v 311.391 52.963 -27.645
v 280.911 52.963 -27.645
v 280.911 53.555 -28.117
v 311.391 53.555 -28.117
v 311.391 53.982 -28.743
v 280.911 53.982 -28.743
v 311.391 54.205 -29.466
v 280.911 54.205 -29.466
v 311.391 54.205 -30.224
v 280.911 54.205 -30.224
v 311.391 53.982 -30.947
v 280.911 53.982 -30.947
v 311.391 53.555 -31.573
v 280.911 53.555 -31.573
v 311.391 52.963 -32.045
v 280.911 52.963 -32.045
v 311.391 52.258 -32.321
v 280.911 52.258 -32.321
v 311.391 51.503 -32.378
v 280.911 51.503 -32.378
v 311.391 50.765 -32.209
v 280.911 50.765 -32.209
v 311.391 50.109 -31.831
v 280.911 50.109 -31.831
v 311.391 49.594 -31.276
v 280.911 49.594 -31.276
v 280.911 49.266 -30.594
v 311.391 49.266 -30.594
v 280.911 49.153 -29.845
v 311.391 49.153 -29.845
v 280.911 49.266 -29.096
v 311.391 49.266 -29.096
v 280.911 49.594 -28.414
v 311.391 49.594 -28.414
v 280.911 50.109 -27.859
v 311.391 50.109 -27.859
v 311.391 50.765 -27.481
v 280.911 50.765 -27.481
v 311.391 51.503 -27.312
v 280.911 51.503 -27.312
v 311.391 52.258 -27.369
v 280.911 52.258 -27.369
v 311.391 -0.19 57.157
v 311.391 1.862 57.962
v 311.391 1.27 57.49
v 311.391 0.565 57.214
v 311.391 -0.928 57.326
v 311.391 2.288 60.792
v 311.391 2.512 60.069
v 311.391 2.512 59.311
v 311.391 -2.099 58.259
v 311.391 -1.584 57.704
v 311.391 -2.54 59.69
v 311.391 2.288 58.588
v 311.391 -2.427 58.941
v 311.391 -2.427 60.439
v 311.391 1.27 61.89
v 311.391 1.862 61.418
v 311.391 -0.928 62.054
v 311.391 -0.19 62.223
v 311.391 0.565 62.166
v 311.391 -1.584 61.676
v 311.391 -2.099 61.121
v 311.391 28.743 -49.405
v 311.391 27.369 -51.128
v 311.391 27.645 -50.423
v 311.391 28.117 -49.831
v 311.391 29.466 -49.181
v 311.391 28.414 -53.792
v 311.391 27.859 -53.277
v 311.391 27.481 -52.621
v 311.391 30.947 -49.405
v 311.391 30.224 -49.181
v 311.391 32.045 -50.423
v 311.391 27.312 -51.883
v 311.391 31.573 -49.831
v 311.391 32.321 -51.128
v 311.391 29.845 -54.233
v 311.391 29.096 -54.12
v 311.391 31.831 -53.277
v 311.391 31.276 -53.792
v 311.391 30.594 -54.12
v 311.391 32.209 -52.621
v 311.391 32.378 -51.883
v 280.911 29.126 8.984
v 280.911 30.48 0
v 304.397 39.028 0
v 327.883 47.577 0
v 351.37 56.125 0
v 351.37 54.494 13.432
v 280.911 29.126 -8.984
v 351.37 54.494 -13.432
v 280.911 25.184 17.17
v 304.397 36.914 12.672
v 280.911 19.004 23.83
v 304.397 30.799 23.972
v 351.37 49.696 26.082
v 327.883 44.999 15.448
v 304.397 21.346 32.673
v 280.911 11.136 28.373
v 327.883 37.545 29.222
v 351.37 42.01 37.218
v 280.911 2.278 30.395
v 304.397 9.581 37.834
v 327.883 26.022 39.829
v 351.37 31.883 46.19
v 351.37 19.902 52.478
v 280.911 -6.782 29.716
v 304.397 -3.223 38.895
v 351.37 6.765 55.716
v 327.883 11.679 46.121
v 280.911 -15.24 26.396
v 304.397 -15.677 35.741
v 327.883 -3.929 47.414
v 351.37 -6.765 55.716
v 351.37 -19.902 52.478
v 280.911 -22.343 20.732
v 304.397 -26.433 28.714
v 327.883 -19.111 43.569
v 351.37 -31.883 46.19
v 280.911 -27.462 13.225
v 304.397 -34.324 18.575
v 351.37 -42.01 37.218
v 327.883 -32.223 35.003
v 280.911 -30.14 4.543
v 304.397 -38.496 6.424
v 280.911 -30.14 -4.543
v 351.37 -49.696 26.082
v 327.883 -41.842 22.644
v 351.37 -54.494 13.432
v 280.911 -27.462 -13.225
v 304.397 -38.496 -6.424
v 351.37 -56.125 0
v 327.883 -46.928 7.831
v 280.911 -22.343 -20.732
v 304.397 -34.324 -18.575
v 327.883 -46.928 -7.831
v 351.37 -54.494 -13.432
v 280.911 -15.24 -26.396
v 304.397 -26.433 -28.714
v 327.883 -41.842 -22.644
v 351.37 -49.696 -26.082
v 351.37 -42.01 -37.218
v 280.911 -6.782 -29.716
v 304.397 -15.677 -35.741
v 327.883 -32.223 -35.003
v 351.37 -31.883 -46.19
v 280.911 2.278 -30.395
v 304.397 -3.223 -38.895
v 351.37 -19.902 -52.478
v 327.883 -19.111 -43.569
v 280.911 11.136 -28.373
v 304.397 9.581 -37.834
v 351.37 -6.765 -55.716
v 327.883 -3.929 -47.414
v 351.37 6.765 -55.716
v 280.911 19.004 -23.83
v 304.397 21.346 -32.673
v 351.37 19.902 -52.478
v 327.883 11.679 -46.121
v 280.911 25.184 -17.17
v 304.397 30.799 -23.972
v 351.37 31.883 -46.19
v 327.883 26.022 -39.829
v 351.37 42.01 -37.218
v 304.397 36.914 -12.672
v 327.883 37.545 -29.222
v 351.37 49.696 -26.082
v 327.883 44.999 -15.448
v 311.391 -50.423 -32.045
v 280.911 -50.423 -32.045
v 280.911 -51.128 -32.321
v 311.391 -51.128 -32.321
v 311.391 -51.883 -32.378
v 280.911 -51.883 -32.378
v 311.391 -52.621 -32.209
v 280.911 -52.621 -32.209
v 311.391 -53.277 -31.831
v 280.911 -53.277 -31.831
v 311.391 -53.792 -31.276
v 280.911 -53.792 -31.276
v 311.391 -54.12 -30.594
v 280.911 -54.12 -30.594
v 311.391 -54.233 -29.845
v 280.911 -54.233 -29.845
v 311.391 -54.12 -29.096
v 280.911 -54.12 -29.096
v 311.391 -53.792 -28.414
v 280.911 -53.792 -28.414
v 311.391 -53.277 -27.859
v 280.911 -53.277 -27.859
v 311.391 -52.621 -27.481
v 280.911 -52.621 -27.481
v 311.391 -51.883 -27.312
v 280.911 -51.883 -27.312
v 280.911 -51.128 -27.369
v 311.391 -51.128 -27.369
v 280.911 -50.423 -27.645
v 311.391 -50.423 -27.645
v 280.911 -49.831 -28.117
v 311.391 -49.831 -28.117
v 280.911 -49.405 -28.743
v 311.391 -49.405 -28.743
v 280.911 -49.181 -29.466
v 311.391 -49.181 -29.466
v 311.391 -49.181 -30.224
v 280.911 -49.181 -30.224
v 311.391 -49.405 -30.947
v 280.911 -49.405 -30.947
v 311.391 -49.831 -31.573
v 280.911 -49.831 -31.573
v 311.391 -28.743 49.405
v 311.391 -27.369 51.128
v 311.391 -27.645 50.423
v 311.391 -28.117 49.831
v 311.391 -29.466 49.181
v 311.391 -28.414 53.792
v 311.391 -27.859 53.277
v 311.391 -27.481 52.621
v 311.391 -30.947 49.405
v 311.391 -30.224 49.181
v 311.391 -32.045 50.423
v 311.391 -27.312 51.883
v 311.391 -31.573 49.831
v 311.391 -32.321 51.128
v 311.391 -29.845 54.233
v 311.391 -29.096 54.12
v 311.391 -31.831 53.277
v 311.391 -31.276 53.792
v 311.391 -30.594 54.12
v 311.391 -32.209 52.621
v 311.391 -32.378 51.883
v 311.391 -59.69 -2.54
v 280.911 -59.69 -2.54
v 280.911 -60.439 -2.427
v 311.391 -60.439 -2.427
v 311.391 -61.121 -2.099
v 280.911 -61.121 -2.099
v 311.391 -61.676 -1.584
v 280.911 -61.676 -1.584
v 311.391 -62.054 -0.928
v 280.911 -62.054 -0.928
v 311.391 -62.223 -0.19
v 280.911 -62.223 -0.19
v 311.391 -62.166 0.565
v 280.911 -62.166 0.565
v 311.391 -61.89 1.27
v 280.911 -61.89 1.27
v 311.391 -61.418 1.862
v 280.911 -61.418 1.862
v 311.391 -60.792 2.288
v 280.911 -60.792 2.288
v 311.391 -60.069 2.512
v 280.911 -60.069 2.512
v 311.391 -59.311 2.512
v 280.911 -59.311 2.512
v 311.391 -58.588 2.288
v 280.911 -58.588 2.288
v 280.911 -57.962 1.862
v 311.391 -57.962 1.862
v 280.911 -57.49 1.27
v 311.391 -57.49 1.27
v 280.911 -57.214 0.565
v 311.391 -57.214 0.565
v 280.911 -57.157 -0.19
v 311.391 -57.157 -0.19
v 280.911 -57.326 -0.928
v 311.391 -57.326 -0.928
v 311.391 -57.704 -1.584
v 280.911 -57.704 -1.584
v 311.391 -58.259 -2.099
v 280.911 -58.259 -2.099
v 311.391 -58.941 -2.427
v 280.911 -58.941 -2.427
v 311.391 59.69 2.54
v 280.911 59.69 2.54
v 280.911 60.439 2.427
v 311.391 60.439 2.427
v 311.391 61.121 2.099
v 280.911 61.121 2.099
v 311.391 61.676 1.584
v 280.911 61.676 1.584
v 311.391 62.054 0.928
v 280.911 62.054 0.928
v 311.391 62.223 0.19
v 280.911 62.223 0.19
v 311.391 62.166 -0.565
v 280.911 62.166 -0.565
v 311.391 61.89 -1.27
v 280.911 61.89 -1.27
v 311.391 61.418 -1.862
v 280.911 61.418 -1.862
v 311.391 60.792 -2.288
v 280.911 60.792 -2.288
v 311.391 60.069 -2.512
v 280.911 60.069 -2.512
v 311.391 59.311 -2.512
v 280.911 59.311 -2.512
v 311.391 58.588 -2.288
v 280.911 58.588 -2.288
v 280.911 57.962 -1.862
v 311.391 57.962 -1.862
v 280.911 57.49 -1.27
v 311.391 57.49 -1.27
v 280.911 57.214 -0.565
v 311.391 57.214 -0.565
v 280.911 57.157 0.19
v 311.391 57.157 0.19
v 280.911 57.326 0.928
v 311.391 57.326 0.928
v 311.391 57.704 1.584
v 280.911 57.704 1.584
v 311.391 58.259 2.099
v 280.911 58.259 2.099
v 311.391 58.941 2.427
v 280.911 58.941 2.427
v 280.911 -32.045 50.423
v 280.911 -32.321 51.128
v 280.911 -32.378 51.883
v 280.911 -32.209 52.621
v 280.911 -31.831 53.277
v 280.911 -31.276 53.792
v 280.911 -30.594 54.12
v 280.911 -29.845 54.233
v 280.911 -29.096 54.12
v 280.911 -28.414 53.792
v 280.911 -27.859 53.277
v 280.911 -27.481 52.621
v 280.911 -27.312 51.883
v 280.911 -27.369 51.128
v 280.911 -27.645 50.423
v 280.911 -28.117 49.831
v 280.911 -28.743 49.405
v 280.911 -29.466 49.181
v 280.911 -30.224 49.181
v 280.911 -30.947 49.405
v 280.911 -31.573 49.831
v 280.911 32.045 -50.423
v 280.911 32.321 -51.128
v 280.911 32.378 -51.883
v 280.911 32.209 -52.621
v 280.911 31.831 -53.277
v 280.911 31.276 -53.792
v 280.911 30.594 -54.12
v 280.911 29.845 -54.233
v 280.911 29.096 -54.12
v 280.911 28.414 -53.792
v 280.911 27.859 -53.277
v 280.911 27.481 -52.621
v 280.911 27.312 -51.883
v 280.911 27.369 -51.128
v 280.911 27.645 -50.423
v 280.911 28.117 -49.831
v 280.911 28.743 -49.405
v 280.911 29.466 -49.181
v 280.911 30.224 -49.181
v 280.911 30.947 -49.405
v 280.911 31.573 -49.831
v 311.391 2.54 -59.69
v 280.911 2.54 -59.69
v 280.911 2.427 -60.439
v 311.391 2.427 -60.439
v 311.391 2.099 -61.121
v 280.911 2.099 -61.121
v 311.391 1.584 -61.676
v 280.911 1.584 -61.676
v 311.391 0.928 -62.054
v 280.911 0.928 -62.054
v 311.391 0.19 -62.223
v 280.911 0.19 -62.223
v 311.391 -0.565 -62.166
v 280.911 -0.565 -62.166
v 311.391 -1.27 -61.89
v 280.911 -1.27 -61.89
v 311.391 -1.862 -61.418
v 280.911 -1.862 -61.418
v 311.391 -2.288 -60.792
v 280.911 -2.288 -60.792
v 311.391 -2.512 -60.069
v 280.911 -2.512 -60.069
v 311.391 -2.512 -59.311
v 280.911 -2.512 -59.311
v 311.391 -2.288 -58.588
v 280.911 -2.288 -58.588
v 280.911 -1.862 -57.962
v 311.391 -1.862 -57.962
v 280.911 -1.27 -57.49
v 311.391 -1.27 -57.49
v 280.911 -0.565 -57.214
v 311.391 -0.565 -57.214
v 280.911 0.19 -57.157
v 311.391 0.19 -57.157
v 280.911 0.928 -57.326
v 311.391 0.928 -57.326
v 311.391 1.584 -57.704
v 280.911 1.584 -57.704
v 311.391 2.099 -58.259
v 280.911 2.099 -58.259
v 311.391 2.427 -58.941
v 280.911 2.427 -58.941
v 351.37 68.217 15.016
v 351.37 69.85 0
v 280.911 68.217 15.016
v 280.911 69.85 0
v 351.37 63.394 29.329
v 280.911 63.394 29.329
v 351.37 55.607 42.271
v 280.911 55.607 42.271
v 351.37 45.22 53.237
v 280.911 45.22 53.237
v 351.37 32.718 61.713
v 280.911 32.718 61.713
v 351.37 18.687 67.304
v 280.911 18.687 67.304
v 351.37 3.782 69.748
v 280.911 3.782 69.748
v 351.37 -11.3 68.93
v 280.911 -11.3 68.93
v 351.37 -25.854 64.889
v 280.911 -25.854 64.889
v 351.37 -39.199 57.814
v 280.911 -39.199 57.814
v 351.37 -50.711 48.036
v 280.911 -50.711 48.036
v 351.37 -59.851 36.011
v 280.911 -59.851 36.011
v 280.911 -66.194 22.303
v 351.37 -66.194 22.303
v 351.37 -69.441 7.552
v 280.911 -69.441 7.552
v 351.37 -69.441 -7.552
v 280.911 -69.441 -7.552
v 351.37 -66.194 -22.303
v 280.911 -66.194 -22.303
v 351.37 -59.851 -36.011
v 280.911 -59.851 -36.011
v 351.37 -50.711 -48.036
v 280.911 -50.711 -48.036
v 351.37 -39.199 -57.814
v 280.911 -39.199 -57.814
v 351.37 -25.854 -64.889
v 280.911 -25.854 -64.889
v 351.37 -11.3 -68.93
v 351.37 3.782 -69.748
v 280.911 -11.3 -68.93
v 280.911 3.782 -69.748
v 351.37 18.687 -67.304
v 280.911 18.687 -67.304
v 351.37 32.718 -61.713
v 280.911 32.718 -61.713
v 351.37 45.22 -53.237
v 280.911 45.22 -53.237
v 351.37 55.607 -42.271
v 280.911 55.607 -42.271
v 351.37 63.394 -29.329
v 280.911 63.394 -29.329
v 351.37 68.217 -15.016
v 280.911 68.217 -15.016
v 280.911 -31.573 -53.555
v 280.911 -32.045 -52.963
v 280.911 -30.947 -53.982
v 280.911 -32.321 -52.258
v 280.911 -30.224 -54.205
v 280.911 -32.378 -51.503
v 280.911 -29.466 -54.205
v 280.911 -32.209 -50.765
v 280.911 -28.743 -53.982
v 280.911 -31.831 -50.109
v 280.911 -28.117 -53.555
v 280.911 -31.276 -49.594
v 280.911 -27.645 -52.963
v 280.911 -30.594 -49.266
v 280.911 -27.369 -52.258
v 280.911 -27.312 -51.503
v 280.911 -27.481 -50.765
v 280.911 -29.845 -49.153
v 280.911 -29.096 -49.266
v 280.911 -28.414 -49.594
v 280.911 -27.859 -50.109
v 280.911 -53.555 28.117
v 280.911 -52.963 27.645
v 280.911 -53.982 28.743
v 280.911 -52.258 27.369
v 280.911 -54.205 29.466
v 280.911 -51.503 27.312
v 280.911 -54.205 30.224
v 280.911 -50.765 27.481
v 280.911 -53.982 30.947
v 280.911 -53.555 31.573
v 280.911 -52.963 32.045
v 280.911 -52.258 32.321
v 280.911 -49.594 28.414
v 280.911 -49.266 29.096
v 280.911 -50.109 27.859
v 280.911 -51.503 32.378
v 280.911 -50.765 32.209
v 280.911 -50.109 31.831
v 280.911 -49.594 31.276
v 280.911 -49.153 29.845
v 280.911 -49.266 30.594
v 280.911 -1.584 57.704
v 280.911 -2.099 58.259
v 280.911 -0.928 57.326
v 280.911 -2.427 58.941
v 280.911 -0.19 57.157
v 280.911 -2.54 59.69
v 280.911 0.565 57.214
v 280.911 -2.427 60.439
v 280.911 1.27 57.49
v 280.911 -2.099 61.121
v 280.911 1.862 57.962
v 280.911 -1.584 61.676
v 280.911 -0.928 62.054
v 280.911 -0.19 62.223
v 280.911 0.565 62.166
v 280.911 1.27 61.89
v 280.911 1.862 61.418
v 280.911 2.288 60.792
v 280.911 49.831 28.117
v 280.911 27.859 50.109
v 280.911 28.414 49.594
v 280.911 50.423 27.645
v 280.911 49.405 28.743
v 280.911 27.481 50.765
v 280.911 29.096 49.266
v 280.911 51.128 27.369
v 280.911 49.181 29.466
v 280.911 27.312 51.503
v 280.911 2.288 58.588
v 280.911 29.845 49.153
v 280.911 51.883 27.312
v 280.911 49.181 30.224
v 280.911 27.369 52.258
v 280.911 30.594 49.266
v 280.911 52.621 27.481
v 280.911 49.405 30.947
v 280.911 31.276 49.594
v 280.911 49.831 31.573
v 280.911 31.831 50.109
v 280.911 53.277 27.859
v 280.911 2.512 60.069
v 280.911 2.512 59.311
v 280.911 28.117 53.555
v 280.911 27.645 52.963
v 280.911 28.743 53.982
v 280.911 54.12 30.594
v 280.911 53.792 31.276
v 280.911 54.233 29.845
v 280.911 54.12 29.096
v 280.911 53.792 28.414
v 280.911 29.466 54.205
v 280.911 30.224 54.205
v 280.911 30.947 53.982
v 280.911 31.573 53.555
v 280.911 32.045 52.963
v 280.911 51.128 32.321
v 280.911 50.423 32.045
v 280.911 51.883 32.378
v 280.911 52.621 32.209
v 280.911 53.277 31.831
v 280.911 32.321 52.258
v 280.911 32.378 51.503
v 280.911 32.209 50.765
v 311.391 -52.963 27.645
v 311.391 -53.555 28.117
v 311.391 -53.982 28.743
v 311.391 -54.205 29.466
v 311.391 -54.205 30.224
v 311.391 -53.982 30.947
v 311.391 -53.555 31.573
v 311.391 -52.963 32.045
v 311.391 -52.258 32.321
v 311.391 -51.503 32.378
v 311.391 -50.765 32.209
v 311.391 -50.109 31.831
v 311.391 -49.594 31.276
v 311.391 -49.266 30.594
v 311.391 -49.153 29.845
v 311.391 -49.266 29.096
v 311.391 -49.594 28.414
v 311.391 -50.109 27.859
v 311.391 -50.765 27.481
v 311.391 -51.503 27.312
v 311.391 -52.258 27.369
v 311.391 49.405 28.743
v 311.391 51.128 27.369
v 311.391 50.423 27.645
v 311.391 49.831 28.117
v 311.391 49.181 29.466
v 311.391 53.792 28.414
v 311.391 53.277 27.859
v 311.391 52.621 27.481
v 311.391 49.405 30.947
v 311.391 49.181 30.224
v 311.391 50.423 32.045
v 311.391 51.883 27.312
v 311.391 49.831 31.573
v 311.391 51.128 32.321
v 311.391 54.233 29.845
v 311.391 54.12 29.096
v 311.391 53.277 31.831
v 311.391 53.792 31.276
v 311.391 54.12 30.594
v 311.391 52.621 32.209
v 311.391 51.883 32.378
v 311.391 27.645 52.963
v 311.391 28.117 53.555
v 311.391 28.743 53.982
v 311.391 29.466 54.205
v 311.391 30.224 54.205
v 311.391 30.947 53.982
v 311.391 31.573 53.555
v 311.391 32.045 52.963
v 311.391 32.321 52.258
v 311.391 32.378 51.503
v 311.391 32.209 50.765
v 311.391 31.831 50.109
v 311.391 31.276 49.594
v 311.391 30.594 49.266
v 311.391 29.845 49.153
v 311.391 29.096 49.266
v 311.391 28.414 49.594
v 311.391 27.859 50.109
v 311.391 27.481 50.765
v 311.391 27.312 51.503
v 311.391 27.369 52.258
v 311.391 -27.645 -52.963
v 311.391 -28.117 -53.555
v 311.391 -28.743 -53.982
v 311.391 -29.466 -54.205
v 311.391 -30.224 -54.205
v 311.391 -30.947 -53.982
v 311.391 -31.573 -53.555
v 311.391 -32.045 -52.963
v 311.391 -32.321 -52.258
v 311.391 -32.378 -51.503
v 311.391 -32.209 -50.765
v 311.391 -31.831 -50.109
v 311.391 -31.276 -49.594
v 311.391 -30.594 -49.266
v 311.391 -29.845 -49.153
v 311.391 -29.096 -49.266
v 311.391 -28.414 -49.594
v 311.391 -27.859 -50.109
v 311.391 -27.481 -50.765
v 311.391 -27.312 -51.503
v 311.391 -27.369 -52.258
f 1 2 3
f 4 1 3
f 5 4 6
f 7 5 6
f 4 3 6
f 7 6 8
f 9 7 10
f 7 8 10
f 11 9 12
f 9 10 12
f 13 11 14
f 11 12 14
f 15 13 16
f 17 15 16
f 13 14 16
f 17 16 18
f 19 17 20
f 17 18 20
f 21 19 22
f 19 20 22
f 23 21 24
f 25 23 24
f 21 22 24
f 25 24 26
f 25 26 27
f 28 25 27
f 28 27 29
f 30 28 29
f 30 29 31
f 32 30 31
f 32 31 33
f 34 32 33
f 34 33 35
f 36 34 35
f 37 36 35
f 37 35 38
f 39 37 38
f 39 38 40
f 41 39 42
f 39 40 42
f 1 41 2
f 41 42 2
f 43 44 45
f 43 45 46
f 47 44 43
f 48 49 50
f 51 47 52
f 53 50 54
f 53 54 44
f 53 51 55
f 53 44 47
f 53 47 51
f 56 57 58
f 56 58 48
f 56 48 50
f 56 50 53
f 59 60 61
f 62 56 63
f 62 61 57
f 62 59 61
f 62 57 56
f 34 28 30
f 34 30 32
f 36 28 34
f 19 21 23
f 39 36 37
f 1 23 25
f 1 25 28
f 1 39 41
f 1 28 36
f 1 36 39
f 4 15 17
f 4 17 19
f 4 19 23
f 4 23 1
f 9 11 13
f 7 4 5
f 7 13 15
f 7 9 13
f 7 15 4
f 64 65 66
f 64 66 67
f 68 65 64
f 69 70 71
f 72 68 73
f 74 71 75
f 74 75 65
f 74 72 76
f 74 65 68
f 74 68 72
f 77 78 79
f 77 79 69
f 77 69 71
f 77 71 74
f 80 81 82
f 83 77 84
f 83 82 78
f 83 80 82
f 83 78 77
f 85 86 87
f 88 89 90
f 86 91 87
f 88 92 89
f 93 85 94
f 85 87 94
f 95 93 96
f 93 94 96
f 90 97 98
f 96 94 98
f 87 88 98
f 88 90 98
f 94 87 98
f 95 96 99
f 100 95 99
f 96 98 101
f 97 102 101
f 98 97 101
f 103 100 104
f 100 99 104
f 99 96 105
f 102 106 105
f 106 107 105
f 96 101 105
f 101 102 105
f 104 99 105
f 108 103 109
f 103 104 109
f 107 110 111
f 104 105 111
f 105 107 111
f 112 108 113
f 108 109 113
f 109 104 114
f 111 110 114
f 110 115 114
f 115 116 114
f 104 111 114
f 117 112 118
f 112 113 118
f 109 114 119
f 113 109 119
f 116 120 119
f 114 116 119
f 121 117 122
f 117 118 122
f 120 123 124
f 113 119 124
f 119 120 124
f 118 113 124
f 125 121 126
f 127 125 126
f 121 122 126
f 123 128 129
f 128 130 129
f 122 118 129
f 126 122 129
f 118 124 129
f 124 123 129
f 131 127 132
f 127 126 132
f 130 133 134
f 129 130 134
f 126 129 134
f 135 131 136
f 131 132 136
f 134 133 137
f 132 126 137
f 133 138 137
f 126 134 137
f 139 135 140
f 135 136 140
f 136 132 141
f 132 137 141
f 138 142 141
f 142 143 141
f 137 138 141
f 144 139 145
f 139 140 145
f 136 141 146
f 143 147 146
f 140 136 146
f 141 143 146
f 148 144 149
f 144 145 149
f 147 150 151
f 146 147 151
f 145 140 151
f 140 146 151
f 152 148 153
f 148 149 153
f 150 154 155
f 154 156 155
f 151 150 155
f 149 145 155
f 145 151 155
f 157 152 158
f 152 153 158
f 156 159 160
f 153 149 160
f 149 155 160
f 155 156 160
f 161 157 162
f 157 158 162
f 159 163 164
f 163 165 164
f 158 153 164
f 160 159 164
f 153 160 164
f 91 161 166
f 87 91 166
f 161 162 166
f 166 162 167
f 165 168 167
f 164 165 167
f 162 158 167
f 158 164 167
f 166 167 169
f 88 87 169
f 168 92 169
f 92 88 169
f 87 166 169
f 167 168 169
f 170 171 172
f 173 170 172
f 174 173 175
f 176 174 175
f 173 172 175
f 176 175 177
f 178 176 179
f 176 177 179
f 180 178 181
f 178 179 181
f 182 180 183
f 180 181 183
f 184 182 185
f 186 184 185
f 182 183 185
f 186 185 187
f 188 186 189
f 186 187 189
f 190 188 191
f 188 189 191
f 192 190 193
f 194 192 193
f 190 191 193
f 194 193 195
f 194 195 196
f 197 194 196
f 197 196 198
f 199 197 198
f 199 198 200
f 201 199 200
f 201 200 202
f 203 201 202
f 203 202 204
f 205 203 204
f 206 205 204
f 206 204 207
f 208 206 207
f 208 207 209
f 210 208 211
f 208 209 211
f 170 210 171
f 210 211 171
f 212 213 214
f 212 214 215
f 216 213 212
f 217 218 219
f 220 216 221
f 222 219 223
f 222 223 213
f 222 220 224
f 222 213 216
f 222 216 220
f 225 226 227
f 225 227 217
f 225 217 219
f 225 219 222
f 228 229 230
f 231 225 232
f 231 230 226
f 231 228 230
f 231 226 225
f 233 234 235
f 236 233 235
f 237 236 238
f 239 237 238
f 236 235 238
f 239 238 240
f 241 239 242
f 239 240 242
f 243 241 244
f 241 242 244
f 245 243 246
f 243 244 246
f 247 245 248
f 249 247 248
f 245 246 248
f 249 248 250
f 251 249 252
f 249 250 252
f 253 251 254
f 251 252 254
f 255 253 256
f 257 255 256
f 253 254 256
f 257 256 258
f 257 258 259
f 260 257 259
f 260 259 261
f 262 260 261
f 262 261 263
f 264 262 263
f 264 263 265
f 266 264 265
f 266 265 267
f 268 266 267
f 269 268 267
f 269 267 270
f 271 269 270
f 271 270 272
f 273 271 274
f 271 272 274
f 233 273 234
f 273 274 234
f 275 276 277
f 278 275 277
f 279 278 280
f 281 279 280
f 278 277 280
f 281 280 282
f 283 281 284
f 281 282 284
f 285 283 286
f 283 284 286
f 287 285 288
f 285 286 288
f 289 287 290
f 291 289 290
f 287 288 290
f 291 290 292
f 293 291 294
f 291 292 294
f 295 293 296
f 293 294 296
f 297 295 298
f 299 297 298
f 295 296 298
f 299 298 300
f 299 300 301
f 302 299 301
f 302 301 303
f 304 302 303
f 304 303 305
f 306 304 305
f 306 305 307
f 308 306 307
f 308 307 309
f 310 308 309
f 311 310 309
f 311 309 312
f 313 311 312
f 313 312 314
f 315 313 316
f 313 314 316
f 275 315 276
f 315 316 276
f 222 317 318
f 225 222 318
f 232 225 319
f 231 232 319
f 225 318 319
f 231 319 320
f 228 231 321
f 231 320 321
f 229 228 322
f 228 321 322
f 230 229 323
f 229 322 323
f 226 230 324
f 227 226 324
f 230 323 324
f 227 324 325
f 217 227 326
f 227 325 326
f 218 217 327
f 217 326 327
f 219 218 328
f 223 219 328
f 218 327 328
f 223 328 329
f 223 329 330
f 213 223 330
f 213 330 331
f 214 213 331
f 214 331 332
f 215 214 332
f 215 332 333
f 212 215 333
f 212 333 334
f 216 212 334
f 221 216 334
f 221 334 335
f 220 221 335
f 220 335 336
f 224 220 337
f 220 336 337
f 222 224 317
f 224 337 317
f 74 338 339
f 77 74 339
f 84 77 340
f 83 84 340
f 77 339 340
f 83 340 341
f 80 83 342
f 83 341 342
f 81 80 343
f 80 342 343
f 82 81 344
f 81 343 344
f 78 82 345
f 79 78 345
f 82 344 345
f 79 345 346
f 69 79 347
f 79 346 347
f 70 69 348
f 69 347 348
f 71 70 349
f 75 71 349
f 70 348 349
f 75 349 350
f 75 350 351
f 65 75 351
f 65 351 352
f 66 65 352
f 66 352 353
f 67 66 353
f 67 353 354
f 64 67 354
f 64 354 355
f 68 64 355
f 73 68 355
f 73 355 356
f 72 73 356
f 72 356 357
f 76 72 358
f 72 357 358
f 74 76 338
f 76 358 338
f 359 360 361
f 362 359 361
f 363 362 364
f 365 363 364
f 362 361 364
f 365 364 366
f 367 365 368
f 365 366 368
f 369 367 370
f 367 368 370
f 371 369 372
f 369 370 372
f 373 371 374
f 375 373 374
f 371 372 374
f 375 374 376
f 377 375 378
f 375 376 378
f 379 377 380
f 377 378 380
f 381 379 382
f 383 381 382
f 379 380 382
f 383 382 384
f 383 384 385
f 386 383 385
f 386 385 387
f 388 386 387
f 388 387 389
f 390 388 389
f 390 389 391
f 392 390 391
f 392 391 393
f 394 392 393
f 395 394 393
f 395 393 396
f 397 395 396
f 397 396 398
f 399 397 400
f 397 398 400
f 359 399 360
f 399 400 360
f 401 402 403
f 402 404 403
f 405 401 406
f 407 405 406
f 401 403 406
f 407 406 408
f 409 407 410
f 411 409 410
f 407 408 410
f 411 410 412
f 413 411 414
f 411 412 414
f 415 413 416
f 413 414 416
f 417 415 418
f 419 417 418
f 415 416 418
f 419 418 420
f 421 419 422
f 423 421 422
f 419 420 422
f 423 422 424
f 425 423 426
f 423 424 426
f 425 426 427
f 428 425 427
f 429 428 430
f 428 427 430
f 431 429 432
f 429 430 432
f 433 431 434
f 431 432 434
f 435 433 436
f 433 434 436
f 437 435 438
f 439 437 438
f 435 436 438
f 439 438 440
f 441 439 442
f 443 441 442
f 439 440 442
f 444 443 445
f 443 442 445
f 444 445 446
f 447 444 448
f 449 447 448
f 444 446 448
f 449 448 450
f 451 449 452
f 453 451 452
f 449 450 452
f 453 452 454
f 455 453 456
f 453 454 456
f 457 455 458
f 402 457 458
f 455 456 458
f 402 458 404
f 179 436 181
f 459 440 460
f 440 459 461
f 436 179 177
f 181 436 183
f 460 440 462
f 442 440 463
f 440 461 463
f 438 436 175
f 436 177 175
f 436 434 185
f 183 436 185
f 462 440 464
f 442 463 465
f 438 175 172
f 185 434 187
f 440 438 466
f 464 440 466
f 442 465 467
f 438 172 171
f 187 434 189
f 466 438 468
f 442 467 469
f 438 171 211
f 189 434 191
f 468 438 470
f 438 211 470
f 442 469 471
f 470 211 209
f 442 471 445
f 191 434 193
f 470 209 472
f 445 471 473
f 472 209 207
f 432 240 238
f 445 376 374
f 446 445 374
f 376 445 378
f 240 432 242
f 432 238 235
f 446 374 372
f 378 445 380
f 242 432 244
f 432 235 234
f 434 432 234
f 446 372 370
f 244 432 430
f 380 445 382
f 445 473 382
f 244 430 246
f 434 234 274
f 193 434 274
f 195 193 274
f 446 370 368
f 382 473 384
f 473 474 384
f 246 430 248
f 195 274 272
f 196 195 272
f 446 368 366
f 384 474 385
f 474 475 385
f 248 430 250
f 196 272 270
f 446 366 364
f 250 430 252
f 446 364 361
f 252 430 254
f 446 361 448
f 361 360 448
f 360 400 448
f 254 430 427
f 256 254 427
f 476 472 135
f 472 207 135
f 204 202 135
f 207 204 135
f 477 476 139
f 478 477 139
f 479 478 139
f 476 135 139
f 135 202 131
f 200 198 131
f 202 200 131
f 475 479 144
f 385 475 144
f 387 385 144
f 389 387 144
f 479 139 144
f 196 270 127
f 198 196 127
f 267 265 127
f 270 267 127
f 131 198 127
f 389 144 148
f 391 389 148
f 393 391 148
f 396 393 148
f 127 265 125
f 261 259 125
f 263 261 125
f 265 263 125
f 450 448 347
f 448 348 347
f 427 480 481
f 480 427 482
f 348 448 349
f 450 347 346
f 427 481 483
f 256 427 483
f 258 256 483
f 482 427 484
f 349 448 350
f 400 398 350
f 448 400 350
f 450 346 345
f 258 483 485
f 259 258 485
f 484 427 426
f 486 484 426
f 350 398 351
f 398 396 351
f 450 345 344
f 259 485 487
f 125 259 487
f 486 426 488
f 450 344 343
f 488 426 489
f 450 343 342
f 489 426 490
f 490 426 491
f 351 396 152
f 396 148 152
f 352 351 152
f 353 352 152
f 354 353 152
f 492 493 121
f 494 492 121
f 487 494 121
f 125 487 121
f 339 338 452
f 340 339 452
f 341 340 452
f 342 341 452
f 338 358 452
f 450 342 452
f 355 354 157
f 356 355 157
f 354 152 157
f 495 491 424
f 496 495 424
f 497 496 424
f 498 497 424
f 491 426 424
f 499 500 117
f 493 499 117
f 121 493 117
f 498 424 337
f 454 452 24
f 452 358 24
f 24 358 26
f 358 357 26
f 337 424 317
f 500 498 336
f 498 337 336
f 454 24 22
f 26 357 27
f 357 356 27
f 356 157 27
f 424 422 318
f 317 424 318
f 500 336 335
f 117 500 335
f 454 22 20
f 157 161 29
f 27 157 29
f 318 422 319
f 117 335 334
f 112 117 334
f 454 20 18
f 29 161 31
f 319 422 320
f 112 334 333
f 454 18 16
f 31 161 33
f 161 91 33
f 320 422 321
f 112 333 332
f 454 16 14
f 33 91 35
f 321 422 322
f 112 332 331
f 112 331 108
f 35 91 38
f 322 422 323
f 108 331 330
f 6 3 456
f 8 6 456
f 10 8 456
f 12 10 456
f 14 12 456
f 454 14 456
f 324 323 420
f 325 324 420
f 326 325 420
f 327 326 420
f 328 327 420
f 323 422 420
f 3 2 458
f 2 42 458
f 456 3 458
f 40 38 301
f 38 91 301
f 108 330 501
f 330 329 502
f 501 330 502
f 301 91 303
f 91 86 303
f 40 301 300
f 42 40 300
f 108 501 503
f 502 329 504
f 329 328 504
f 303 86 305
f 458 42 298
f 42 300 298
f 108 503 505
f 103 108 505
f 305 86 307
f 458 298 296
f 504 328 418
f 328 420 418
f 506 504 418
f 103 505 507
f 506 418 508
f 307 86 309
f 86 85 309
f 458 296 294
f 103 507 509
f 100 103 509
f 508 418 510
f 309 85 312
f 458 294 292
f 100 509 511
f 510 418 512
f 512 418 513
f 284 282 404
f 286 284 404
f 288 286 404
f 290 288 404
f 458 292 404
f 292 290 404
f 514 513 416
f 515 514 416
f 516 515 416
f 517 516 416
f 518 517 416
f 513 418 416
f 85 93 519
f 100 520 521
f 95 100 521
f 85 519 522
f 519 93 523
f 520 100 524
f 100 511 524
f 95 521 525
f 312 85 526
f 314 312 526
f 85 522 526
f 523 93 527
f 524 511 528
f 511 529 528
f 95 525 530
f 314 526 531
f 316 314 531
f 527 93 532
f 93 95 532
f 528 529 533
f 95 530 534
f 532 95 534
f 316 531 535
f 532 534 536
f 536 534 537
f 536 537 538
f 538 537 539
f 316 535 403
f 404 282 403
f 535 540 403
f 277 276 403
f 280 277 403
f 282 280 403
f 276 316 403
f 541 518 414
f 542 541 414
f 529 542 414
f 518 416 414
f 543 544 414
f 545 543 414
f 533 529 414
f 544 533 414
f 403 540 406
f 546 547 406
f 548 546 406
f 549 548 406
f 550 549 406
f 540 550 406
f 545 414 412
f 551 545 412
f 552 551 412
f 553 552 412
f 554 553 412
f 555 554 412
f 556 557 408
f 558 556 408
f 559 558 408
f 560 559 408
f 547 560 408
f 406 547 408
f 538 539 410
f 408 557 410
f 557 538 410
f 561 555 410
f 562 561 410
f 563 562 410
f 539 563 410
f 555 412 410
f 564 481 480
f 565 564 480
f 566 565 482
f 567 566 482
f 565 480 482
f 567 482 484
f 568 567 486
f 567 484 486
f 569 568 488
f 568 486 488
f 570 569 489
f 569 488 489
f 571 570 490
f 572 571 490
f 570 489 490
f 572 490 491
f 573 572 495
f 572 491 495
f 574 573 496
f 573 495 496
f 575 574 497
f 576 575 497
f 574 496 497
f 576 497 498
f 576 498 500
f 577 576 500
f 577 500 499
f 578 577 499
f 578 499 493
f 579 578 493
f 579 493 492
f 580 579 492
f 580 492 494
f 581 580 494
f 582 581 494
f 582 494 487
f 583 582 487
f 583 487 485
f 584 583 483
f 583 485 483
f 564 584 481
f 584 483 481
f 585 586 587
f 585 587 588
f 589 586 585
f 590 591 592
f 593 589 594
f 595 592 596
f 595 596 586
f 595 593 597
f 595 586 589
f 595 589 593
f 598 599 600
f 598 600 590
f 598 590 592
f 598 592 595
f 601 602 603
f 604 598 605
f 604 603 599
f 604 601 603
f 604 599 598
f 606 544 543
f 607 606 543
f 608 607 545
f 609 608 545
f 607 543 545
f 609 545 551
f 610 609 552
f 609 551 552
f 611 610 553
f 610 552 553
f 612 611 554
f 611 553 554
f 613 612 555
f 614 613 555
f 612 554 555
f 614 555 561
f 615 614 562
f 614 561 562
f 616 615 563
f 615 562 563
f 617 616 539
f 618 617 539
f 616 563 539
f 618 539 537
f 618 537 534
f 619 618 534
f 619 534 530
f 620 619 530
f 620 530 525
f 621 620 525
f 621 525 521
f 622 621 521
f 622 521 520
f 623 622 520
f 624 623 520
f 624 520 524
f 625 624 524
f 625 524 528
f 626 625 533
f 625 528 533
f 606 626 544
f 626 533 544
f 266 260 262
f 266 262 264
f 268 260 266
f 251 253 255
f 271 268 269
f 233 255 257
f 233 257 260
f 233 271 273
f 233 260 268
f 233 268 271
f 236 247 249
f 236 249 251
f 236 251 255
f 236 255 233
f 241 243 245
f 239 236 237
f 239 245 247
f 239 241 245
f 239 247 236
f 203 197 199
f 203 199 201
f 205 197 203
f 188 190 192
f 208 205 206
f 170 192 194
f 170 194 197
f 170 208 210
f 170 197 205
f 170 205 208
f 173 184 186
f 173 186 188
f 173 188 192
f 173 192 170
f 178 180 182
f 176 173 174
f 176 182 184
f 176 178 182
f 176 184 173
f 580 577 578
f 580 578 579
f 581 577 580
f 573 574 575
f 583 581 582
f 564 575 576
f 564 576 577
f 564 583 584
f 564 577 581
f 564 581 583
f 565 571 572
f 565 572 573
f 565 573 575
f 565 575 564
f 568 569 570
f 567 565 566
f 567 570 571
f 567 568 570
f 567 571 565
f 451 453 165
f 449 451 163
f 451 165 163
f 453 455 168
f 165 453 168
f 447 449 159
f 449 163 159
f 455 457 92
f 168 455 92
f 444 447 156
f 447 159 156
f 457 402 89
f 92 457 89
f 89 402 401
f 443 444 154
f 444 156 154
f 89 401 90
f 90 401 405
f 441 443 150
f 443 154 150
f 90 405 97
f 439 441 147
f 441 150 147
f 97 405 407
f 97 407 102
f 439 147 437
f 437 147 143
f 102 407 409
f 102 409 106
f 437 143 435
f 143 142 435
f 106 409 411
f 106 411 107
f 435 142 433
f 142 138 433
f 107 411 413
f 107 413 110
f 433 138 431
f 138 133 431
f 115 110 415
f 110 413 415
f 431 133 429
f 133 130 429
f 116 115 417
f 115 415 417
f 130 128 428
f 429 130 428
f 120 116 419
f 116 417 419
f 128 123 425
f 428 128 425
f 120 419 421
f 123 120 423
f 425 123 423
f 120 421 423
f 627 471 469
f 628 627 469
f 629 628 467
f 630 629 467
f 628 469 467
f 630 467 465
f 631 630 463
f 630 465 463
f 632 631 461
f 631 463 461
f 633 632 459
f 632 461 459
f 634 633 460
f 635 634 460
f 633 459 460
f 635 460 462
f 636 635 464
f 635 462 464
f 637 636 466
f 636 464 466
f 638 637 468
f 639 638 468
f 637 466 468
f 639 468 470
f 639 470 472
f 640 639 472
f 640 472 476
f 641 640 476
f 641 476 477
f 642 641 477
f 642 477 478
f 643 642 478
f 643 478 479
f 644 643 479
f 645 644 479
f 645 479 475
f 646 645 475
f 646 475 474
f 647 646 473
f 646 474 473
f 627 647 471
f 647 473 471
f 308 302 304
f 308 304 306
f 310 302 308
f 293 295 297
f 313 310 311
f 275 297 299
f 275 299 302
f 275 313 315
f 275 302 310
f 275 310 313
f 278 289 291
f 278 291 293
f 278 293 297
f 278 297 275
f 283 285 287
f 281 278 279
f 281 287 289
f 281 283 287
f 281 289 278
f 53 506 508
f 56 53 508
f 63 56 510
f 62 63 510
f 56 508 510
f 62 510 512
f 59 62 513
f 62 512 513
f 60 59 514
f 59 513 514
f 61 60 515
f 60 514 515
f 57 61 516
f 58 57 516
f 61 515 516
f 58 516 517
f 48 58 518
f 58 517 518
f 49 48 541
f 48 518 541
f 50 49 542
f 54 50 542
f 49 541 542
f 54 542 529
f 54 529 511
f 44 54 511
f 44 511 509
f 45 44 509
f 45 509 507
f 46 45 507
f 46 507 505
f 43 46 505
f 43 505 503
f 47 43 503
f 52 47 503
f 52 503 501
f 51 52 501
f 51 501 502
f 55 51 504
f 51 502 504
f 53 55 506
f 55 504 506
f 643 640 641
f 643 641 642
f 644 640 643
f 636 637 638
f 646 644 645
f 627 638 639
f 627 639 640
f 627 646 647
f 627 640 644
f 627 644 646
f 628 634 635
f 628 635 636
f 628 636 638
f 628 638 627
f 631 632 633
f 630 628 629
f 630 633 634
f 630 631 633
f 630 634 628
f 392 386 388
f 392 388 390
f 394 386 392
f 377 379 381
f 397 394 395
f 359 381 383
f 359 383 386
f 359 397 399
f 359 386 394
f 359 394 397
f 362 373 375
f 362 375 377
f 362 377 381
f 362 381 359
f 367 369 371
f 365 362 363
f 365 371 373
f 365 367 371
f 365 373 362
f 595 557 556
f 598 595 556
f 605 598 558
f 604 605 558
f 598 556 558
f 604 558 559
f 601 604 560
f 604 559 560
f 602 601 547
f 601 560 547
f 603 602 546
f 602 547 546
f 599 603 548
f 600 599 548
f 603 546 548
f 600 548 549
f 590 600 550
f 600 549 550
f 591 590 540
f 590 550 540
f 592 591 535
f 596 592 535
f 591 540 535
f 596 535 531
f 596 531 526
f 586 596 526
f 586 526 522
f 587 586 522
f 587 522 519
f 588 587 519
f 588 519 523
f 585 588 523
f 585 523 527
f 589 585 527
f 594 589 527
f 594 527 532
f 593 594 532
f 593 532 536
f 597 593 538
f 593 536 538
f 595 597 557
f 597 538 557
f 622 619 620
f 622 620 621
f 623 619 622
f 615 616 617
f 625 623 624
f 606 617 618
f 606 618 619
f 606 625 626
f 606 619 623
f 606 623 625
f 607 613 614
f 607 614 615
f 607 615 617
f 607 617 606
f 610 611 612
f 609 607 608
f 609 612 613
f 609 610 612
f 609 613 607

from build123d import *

# Parameters (mm, degrees)
SKETCH4_R          = 2.54
CUT_EXTRUDE1_DEPTH = 30.48
CIRPATTERN1_COUNT  = 12


with BuildPart() as part:
    # Sketch1 → Revolve1 (revolve)
    with BuildSketch(Plane.XY):
        Polygon((280.911030354, 30.48), (351.369552102, 56.124804667), (351.369552102, 69.85), (280.911030354, 69.85), (280.911030354, 50.8), align=None)
    revolve(axis=Axis((0, 0, 0), (1, 0, 0)))

    # Sketch4 → Cut-Extrude1 (cut)
    with BuildSketch(Plane.ZY.offset(-280.911030354)):
        with Locations((0, 59.69)):
            Circle(SKETCH4_R)
    cut_extrude1 = extrude(amount=-CUT_EXTRUDE1_DEPTH, mode=Mode.SUBTRACT)

    # CirPattern1: Cut-Extrude1 ×12 about axis
    cirpattern1_axis = Axis((0, 0, 0), (1, 0, 0))
    for i in range(1, CIRPATTERN1_COUNT):
        add(cut_extrude1.rotate(cirpattern1_axis, i * 360 / CIRPATTERN1_COUNT), mode=Mode.SUBTRACT)


solid = part.part
